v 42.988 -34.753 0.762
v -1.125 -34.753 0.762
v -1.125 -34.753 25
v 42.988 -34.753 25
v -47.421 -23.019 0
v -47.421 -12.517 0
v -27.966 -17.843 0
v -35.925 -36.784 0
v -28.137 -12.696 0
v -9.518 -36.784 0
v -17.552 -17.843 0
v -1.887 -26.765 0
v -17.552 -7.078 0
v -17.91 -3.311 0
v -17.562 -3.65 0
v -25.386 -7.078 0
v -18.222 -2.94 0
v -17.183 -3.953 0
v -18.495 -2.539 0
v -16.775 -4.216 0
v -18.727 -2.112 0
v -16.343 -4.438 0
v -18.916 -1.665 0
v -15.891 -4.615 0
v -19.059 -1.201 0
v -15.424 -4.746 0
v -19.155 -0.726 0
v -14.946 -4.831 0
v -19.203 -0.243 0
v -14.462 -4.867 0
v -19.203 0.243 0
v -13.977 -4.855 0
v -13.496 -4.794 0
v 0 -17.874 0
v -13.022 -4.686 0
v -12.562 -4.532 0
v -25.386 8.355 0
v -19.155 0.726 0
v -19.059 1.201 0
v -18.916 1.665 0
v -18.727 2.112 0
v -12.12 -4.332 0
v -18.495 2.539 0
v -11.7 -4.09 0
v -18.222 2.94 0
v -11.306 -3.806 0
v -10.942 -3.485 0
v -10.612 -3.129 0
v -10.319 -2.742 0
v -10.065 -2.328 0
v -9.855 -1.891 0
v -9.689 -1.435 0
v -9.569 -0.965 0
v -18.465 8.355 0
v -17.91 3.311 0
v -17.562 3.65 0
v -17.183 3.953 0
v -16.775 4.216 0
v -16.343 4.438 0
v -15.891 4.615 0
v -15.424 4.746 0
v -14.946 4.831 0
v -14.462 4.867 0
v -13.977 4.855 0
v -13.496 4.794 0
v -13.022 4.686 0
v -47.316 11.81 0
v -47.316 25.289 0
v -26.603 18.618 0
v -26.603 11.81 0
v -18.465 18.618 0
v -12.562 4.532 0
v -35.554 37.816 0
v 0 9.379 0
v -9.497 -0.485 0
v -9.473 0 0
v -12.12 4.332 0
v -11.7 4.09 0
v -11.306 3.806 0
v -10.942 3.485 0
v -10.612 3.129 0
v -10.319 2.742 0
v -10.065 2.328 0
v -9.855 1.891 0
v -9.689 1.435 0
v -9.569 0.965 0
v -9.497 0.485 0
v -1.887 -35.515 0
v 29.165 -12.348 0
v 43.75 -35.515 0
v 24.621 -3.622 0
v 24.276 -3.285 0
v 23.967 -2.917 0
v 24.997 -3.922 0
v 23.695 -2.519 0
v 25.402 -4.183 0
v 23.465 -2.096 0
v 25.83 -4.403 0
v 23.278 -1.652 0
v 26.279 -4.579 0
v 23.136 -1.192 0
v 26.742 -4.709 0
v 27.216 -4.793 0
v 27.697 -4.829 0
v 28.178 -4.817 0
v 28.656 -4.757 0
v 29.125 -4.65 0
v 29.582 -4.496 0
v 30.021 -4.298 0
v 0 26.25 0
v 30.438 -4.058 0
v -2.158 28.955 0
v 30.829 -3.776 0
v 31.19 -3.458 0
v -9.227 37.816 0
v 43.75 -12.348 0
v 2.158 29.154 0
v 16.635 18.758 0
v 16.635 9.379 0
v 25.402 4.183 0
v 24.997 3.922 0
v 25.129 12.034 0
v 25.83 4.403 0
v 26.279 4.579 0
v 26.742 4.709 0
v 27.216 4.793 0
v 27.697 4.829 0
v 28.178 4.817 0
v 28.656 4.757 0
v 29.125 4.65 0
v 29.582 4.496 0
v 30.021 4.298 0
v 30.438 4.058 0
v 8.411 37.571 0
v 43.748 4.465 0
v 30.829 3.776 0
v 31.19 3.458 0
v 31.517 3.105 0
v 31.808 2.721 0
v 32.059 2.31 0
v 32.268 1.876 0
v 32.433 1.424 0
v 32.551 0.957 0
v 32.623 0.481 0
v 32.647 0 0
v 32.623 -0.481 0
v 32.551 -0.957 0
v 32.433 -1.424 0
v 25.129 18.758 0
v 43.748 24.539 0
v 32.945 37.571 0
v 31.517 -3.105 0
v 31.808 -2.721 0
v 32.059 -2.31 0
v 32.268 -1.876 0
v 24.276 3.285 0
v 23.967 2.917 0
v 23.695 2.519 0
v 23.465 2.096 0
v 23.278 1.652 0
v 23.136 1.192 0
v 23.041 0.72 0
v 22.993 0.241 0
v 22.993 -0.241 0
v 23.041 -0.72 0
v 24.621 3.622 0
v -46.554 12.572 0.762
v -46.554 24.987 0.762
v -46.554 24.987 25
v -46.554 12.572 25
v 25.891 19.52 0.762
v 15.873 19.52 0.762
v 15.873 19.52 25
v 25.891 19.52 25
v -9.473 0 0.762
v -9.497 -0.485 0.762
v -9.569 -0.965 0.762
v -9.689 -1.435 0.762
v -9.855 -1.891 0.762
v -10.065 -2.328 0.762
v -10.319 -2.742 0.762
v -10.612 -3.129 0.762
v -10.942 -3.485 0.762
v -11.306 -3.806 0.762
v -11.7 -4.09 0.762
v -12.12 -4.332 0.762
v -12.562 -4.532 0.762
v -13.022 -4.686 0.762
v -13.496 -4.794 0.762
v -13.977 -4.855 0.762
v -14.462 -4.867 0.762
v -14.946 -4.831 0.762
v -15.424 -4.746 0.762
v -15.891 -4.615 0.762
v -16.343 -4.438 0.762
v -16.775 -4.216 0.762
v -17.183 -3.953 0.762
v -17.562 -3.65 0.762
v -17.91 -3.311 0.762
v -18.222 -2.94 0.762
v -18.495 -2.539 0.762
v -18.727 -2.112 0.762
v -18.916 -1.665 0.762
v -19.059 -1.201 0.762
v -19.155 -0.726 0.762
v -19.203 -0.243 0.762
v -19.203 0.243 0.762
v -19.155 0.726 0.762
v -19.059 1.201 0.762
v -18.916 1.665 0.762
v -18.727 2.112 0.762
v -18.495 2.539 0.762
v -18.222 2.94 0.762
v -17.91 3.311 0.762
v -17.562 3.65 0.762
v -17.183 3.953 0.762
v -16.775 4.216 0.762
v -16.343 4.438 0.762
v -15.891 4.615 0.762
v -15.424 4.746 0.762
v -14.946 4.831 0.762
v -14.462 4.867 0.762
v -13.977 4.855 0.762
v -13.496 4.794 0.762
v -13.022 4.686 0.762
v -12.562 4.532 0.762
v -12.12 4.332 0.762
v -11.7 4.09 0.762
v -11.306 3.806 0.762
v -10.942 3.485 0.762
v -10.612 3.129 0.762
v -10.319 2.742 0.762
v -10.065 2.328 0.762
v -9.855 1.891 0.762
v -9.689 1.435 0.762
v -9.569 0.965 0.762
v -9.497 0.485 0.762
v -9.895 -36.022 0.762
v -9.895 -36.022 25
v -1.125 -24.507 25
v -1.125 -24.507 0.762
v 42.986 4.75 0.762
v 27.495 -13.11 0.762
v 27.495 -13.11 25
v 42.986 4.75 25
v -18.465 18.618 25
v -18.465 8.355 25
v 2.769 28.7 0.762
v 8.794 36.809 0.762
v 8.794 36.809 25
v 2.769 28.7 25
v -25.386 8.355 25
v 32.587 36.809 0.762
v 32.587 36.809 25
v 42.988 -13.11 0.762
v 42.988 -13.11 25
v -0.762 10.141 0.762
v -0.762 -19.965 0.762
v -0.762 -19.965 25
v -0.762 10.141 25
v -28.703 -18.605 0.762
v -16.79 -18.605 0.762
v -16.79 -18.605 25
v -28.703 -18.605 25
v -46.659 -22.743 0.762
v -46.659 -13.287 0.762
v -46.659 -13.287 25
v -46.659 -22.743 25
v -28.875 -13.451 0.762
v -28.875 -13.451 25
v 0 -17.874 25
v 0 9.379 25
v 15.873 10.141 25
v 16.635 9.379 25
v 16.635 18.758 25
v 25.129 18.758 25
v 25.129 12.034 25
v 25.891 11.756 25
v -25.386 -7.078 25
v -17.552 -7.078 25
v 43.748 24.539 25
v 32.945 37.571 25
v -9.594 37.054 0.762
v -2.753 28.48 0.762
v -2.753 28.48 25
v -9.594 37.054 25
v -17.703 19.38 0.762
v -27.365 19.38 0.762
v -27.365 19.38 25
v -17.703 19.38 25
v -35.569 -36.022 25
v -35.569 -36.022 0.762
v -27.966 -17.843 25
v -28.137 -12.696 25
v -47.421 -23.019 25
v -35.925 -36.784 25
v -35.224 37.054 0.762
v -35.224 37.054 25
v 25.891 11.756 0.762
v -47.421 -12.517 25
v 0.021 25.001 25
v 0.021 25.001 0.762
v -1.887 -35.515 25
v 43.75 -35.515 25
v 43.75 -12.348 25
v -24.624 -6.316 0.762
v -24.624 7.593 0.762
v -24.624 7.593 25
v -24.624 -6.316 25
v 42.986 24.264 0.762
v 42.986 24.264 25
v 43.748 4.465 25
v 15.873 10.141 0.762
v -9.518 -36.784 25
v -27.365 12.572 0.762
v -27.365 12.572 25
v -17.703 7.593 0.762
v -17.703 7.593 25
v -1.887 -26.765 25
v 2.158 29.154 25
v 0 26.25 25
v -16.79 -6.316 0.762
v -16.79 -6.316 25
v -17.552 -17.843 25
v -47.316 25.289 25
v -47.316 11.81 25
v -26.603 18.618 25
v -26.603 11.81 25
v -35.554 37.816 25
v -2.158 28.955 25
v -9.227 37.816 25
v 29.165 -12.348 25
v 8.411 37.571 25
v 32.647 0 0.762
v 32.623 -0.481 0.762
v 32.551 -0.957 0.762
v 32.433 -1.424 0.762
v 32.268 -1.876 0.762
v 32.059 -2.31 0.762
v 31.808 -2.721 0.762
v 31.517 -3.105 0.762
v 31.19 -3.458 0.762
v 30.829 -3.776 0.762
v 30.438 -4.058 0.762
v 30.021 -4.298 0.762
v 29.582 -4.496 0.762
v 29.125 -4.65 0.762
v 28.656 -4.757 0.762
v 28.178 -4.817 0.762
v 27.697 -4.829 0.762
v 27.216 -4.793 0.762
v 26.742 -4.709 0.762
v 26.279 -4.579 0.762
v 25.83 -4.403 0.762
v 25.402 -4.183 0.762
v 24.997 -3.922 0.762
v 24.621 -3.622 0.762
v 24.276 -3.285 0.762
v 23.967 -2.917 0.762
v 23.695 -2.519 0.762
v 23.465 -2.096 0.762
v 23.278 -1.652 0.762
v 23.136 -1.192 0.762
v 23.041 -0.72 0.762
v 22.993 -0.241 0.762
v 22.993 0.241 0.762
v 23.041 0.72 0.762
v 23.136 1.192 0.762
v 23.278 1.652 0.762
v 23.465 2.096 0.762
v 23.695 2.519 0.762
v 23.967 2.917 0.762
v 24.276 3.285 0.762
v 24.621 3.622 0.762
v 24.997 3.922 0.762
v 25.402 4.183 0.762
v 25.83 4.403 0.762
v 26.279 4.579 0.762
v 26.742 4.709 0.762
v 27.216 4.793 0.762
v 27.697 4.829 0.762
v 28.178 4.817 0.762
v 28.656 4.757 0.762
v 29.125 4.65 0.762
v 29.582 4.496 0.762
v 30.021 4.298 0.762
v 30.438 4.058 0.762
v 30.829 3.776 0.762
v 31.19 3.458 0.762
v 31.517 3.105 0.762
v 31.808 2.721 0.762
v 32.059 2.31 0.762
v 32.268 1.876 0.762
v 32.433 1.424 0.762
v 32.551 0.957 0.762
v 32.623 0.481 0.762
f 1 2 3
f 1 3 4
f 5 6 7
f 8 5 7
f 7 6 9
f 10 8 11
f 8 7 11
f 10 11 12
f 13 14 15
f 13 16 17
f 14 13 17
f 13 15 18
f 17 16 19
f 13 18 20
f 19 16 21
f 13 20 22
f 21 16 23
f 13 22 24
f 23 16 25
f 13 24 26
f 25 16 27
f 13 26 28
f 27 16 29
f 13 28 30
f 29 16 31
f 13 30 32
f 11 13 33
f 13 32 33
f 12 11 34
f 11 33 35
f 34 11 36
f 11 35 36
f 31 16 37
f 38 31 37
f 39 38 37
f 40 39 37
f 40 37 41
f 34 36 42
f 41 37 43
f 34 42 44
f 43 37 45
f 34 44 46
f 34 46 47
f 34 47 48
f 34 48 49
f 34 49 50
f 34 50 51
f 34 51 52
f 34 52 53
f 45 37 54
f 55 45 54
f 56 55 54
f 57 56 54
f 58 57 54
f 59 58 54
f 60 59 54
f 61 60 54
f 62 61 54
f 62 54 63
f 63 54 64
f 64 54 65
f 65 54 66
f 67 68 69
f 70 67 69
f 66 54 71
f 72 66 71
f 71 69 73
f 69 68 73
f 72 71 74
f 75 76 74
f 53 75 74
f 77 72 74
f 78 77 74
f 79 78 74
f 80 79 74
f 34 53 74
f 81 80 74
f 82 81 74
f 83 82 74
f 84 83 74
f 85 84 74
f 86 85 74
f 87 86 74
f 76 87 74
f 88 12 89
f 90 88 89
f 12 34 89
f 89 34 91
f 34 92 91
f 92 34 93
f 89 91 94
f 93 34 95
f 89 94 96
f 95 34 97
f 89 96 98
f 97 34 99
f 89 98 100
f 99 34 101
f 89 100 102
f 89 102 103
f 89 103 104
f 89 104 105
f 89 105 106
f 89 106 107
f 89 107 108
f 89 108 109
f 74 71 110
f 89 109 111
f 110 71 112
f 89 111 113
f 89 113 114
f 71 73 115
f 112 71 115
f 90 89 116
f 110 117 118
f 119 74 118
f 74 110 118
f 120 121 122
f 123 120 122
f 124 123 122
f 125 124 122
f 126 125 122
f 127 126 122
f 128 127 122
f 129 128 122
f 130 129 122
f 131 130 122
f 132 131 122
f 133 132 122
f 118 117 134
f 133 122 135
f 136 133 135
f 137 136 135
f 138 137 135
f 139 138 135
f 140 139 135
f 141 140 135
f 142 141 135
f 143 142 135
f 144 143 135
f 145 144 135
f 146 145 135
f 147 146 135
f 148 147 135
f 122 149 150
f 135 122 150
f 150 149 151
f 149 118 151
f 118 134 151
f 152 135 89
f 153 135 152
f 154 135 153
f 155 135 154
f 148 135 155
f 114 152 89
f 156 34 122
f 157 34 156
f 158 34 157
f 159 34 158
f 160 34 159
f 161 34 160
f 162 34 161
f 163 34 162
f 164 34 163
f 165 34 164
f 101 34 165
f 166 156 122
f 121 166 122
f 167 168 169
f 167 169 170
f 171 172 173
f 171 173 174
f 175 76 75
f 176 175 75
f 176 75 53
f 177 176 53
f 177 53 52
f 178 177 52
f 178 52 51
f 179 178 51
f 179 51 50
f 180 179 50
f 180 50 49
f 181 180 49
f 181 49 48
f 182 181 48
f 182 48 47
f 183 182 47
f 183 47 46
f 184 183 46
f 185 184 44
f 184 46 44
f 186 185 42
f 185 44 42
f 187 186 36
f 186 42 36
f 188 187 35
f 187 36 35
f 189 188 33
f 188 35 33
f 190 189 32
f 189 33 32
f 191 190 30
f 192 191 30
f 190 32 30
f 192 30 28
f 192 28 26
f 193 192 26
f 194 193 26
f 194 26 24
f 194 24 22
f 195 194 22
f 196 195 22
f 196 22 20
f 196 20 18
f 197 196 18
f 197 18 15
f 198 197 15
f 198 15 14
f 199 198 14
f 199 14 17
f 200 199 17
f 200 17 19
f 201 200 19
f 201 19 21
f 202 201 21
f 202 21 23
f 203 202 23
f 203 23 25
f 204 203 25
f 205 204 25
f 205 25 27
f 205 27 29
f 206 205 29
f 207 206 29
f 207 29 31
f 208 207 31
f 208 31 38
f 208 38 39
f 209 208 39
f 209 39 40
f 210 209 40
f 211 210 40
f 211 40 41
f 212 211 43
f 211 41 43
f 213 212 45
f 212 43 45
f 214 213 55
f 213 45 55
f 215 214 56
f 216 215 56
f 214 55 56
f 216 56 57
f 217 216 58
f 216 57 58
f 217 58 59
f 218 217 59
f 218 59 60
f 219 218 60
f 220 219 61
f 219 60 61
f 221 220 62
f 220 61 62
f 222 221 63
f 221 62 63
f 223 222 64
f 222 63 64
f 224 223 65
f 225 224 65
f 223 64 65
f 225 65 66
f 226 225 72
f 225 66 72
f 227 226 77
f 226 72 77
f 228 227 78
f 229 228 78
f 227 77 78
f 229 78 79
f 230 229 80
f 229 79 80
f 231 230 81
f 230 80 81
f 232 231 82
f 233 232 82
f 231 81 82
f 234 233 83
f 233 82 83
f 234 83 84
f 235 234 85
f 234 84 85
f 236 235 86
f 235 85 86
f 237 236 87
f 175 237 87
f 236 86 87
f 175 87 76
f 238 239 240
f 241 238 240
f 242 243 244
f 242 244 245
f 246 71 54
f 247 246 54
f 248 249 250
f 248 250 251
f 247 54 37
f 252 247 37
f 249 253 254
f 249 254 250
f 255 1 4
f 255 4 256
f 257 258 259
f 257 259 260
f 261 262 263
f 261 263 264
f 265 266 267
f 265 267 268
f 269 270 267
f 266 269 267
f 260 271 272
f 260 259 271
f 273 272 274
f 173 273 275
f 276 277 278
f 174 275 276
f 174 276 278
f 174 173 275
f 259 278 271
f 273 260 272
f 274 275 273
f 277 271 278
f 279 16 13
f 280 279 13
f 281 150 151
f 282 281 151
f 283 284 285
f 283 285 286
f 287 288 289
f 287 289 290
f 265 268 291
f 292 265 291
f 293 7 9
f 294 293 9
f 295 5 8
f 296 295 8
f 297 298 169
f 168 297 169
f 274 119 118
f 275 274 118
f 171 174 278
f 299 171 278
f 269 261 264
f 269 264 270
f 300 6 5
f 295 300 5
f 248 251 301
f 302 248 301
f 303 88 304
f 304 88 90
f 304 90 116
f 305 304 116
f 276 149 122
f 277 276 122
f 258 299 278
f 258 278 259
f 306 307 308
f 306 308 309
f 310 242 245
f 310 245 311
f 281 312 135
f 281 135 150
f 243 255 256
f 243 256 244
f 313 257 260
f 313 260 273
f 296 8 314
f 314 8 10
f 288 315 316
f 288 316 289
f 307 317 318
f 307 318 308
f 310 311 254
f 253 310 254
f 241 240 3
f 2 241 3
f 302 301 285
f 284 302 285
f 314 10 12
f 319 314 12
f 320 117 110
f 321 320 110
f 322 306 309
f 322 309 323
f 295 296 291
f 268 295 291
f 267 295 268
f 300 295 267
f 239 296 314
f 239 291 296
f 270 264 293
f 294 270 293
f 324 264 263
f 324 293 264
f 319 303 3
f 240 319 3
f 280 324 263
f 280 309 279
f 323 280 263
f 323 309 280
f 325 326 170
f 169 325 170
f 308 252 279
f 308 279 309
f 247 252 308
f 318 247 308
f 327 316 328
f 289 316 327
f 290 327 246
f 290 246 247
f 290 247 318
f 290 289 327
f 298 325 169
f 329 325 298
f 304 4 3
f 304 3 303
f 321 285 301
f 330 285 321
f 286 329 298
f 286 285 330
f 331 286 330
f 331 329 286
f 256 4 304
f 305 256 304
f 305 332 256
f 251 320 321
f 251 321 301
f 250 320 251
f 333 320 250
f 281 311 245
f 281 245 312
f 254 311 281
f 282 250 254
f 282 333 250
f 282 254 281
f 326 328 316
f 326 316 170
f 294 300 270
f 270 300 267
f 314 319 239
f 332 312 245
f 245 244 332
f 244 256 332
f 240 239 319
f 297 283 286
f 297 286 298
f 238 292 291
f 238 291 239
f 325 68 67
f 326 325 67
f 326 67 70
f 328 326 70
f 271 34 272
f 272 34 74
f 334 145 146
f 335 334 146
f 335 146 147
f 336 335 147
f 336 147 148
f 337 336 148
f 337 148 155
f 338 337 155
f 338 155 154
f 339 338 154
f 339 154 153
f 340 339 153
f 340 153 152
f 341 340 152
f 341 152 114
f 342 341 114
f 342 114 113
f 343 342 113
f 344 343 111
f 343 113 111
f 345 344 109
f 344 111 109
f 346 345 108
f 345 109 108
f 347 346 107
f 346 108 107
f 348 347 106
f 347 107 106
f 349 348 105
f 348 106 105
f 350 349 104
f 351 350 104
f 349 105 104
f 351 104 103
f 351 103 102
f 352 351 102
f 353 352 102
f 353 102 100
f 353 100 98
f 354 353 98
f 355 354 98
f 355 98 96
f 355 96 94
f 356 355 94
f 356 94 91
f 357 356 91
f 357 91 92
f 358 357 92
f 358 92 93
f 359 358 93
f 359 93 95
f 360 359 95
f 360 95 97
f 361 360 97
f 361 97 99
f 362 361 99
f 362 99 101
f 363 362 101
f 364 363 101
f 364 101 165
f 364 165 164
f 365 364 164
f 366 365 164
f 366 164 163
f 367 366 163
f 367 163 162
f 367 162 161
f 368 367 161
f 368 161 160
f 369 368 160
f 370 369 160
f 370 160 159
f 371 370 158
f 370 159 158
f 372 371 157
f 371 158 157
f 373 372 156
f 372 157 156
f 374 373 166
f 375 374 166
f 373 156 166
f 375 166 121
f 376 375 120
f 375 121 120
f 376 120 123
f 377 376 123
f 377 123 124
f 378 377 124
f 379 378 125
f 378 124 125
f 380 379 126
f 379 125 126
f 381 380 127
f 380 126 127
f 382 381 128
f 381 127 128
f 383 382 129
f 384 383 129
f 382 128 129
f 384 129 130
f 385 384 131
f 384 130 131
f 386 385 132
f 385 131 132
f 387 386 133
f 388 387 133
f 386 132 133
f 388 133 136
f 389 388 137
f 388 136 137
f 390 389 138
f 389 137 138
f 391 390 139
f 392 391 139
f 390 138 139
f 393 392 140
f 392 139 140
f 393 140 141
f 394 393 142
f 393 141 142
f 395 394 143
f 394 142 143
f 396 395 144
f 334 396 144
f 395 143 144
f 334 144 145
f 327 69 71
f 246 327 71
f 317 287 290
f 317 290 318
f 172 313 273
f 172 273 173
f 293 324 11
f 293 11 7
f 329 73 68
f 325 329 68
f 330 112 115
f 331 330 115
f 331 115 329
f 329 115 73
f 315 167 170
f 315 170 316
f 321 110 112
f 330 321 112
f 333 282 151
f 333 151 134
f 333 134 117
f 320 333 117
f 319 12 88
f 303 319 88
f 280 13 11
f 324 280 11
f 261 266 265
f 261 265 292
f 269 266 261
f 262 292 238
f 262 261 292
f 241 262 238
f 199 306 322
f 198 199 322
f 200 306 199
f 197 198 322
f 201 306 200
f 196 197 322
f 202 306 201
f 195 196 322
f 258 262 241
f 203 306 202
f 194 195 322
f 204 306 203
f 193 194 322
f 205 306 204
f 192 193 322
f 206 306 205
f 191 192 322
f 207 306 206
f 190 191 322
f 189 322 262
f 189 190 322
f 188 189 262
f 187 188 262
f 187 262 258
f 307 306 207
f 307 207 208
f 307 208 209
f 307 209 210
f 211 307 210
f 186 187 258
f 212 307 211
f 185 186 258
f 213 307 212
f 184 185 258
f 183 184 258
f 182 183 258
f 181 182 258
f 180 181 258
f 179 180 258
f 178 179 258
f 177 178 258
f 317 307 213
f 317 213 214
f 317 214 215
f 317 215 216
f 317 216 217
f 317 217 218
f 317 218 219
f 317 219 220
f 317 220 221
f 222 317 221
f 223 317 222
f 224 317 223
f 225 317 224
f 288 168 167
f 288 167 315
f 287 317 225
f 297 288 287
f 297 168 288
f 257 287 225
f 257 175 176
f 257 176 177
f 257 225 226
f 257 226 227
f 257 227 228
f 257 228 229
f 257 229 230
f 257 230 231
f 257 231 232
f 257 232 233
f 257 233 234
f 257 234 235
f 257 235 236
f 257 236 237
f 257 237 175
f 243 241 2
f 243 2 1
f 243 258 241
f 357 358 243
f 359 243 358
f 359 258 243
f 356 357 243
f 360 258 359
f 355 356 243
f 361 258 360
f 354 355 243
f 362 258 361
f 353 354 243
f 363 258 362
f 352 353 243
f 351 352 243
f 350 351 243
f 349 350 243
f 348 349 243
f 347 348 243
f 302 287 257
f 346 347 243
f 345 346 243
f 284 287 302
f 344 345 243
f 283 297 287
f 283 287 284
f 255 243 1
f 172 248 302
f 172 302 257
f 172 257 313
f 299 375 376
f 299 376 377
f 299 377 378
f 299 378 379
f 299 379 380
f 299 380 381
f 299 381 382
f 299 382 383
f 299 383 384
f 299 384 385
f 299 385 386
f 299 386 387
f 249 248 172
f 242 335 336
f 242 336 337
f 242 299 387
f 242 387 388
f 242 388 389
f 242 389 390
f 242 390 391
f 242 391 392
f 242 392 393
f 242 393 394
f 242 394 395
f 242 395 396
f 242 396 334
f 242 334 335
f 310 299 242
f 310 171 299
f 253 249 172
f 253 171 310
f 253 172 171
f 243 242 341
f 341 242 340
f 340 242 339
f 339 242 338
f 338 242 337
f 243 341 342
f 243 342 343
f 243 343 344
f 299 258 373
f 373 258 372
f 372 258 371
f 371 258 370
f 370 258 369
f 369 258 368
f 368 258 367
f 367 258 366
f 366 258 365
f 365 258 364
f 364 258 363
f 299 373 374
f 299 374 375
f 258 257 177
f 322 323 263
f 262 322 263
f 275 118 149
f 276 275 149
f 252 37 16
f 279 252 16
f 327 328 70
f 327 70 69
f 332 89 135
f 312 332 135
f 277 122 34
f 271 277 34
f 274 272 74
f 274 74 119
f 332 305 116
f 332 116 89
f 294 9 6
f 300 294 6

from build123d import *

# Parameters (mm, degrees)
F2_DEPTH = 25
F3_T     = -0.762
F4_R     = 4.8683707858
F4_R_2   = 4.8302186576
F5_DEPTH = 25


with BuildPart() as f2:
    # F1 (on face) → F2 (new body)
    with BuildSketch(Plane.XY):
        Polygon((0, 9.3792136759), (0, 26.2500010431), (-2.1577780027, 28.9547343873), (-9.2274816707, 37.8164723516), (-35.5537720025, 37.8164723516), (-47.3156645894, 25.2887308598), (-47.3156645894, 11.8099646643), (-26.6031436622, 11.8099646643), (-26.6031436622, 18.618395552), (-18.465153873, 18.618395552), (-18.465153873, 8.3549581468), (-25.3857541829, 8.3549581468), (-25.3857541829, -7.0784804411), (-17.5523422658, -7.0784804411), (-17.5523422658, -17.8431384265), (-27.9656872153, -17.8431384265), (-28.13725546, -12.6960789785), (-47.4213697016, -12.5174866989), (-47.4213697016, -23.0192560703), (-35.9249189496, -36.7836914957), (-9.5176594332, -36.7836914957), (-1.8872555811, -26.7647076398), (0, -17.8735964), align=None)
        Polygon((2.1577780027, 29.1542826942), (0, 26.2500010431), (0, 9.3792136759), (16.634831205, 9.3792136759), (16.634831205, 18.7584273517), (25.1292157918, 18.7584273517), (25.1292157918, 12.0337083936), (0, -17.8735964), (-1.8872555811, -26.7647076398), (-1.8872555811, -35.5147086084), (43.7500029802, -35.5147086084), (43.7500029802, -12.3482472258), (29.1650951026, -12.3482472258), (43.7484294293, 4.4654798699), (43.7484294293, 24.5390101341), (32.9454995436, 37.5711143732), (8.4111846728, 37.5711143732), align=None)
    extrude(amount=F2_DEPTH)

    # F3
    f3_openings = [f2.faces().sort_by_distance(p)[0] for p in [
        (-5.53462, 31.298579, 25),
    ]]
    offset(amount=F3_T, openings=f3_openings, kind=Kind.INTERSECTION)

    # F4 (on face) → F5 (cut)
    with BuildSketch(Plane(origin=(0, 0, 0), x_dir=(1, 0, 0), z_dir=(0, 0, -1))):
        with Locations((-14.3409855664, 0)):
            Circle(F4_R)
        with Locations((27.8169624507, 0)):
            Circle(F4_R_2)
    extrude(amount=-F5_DEPTH, mode=Mode.SUBTRACT)


solid = f2.part
